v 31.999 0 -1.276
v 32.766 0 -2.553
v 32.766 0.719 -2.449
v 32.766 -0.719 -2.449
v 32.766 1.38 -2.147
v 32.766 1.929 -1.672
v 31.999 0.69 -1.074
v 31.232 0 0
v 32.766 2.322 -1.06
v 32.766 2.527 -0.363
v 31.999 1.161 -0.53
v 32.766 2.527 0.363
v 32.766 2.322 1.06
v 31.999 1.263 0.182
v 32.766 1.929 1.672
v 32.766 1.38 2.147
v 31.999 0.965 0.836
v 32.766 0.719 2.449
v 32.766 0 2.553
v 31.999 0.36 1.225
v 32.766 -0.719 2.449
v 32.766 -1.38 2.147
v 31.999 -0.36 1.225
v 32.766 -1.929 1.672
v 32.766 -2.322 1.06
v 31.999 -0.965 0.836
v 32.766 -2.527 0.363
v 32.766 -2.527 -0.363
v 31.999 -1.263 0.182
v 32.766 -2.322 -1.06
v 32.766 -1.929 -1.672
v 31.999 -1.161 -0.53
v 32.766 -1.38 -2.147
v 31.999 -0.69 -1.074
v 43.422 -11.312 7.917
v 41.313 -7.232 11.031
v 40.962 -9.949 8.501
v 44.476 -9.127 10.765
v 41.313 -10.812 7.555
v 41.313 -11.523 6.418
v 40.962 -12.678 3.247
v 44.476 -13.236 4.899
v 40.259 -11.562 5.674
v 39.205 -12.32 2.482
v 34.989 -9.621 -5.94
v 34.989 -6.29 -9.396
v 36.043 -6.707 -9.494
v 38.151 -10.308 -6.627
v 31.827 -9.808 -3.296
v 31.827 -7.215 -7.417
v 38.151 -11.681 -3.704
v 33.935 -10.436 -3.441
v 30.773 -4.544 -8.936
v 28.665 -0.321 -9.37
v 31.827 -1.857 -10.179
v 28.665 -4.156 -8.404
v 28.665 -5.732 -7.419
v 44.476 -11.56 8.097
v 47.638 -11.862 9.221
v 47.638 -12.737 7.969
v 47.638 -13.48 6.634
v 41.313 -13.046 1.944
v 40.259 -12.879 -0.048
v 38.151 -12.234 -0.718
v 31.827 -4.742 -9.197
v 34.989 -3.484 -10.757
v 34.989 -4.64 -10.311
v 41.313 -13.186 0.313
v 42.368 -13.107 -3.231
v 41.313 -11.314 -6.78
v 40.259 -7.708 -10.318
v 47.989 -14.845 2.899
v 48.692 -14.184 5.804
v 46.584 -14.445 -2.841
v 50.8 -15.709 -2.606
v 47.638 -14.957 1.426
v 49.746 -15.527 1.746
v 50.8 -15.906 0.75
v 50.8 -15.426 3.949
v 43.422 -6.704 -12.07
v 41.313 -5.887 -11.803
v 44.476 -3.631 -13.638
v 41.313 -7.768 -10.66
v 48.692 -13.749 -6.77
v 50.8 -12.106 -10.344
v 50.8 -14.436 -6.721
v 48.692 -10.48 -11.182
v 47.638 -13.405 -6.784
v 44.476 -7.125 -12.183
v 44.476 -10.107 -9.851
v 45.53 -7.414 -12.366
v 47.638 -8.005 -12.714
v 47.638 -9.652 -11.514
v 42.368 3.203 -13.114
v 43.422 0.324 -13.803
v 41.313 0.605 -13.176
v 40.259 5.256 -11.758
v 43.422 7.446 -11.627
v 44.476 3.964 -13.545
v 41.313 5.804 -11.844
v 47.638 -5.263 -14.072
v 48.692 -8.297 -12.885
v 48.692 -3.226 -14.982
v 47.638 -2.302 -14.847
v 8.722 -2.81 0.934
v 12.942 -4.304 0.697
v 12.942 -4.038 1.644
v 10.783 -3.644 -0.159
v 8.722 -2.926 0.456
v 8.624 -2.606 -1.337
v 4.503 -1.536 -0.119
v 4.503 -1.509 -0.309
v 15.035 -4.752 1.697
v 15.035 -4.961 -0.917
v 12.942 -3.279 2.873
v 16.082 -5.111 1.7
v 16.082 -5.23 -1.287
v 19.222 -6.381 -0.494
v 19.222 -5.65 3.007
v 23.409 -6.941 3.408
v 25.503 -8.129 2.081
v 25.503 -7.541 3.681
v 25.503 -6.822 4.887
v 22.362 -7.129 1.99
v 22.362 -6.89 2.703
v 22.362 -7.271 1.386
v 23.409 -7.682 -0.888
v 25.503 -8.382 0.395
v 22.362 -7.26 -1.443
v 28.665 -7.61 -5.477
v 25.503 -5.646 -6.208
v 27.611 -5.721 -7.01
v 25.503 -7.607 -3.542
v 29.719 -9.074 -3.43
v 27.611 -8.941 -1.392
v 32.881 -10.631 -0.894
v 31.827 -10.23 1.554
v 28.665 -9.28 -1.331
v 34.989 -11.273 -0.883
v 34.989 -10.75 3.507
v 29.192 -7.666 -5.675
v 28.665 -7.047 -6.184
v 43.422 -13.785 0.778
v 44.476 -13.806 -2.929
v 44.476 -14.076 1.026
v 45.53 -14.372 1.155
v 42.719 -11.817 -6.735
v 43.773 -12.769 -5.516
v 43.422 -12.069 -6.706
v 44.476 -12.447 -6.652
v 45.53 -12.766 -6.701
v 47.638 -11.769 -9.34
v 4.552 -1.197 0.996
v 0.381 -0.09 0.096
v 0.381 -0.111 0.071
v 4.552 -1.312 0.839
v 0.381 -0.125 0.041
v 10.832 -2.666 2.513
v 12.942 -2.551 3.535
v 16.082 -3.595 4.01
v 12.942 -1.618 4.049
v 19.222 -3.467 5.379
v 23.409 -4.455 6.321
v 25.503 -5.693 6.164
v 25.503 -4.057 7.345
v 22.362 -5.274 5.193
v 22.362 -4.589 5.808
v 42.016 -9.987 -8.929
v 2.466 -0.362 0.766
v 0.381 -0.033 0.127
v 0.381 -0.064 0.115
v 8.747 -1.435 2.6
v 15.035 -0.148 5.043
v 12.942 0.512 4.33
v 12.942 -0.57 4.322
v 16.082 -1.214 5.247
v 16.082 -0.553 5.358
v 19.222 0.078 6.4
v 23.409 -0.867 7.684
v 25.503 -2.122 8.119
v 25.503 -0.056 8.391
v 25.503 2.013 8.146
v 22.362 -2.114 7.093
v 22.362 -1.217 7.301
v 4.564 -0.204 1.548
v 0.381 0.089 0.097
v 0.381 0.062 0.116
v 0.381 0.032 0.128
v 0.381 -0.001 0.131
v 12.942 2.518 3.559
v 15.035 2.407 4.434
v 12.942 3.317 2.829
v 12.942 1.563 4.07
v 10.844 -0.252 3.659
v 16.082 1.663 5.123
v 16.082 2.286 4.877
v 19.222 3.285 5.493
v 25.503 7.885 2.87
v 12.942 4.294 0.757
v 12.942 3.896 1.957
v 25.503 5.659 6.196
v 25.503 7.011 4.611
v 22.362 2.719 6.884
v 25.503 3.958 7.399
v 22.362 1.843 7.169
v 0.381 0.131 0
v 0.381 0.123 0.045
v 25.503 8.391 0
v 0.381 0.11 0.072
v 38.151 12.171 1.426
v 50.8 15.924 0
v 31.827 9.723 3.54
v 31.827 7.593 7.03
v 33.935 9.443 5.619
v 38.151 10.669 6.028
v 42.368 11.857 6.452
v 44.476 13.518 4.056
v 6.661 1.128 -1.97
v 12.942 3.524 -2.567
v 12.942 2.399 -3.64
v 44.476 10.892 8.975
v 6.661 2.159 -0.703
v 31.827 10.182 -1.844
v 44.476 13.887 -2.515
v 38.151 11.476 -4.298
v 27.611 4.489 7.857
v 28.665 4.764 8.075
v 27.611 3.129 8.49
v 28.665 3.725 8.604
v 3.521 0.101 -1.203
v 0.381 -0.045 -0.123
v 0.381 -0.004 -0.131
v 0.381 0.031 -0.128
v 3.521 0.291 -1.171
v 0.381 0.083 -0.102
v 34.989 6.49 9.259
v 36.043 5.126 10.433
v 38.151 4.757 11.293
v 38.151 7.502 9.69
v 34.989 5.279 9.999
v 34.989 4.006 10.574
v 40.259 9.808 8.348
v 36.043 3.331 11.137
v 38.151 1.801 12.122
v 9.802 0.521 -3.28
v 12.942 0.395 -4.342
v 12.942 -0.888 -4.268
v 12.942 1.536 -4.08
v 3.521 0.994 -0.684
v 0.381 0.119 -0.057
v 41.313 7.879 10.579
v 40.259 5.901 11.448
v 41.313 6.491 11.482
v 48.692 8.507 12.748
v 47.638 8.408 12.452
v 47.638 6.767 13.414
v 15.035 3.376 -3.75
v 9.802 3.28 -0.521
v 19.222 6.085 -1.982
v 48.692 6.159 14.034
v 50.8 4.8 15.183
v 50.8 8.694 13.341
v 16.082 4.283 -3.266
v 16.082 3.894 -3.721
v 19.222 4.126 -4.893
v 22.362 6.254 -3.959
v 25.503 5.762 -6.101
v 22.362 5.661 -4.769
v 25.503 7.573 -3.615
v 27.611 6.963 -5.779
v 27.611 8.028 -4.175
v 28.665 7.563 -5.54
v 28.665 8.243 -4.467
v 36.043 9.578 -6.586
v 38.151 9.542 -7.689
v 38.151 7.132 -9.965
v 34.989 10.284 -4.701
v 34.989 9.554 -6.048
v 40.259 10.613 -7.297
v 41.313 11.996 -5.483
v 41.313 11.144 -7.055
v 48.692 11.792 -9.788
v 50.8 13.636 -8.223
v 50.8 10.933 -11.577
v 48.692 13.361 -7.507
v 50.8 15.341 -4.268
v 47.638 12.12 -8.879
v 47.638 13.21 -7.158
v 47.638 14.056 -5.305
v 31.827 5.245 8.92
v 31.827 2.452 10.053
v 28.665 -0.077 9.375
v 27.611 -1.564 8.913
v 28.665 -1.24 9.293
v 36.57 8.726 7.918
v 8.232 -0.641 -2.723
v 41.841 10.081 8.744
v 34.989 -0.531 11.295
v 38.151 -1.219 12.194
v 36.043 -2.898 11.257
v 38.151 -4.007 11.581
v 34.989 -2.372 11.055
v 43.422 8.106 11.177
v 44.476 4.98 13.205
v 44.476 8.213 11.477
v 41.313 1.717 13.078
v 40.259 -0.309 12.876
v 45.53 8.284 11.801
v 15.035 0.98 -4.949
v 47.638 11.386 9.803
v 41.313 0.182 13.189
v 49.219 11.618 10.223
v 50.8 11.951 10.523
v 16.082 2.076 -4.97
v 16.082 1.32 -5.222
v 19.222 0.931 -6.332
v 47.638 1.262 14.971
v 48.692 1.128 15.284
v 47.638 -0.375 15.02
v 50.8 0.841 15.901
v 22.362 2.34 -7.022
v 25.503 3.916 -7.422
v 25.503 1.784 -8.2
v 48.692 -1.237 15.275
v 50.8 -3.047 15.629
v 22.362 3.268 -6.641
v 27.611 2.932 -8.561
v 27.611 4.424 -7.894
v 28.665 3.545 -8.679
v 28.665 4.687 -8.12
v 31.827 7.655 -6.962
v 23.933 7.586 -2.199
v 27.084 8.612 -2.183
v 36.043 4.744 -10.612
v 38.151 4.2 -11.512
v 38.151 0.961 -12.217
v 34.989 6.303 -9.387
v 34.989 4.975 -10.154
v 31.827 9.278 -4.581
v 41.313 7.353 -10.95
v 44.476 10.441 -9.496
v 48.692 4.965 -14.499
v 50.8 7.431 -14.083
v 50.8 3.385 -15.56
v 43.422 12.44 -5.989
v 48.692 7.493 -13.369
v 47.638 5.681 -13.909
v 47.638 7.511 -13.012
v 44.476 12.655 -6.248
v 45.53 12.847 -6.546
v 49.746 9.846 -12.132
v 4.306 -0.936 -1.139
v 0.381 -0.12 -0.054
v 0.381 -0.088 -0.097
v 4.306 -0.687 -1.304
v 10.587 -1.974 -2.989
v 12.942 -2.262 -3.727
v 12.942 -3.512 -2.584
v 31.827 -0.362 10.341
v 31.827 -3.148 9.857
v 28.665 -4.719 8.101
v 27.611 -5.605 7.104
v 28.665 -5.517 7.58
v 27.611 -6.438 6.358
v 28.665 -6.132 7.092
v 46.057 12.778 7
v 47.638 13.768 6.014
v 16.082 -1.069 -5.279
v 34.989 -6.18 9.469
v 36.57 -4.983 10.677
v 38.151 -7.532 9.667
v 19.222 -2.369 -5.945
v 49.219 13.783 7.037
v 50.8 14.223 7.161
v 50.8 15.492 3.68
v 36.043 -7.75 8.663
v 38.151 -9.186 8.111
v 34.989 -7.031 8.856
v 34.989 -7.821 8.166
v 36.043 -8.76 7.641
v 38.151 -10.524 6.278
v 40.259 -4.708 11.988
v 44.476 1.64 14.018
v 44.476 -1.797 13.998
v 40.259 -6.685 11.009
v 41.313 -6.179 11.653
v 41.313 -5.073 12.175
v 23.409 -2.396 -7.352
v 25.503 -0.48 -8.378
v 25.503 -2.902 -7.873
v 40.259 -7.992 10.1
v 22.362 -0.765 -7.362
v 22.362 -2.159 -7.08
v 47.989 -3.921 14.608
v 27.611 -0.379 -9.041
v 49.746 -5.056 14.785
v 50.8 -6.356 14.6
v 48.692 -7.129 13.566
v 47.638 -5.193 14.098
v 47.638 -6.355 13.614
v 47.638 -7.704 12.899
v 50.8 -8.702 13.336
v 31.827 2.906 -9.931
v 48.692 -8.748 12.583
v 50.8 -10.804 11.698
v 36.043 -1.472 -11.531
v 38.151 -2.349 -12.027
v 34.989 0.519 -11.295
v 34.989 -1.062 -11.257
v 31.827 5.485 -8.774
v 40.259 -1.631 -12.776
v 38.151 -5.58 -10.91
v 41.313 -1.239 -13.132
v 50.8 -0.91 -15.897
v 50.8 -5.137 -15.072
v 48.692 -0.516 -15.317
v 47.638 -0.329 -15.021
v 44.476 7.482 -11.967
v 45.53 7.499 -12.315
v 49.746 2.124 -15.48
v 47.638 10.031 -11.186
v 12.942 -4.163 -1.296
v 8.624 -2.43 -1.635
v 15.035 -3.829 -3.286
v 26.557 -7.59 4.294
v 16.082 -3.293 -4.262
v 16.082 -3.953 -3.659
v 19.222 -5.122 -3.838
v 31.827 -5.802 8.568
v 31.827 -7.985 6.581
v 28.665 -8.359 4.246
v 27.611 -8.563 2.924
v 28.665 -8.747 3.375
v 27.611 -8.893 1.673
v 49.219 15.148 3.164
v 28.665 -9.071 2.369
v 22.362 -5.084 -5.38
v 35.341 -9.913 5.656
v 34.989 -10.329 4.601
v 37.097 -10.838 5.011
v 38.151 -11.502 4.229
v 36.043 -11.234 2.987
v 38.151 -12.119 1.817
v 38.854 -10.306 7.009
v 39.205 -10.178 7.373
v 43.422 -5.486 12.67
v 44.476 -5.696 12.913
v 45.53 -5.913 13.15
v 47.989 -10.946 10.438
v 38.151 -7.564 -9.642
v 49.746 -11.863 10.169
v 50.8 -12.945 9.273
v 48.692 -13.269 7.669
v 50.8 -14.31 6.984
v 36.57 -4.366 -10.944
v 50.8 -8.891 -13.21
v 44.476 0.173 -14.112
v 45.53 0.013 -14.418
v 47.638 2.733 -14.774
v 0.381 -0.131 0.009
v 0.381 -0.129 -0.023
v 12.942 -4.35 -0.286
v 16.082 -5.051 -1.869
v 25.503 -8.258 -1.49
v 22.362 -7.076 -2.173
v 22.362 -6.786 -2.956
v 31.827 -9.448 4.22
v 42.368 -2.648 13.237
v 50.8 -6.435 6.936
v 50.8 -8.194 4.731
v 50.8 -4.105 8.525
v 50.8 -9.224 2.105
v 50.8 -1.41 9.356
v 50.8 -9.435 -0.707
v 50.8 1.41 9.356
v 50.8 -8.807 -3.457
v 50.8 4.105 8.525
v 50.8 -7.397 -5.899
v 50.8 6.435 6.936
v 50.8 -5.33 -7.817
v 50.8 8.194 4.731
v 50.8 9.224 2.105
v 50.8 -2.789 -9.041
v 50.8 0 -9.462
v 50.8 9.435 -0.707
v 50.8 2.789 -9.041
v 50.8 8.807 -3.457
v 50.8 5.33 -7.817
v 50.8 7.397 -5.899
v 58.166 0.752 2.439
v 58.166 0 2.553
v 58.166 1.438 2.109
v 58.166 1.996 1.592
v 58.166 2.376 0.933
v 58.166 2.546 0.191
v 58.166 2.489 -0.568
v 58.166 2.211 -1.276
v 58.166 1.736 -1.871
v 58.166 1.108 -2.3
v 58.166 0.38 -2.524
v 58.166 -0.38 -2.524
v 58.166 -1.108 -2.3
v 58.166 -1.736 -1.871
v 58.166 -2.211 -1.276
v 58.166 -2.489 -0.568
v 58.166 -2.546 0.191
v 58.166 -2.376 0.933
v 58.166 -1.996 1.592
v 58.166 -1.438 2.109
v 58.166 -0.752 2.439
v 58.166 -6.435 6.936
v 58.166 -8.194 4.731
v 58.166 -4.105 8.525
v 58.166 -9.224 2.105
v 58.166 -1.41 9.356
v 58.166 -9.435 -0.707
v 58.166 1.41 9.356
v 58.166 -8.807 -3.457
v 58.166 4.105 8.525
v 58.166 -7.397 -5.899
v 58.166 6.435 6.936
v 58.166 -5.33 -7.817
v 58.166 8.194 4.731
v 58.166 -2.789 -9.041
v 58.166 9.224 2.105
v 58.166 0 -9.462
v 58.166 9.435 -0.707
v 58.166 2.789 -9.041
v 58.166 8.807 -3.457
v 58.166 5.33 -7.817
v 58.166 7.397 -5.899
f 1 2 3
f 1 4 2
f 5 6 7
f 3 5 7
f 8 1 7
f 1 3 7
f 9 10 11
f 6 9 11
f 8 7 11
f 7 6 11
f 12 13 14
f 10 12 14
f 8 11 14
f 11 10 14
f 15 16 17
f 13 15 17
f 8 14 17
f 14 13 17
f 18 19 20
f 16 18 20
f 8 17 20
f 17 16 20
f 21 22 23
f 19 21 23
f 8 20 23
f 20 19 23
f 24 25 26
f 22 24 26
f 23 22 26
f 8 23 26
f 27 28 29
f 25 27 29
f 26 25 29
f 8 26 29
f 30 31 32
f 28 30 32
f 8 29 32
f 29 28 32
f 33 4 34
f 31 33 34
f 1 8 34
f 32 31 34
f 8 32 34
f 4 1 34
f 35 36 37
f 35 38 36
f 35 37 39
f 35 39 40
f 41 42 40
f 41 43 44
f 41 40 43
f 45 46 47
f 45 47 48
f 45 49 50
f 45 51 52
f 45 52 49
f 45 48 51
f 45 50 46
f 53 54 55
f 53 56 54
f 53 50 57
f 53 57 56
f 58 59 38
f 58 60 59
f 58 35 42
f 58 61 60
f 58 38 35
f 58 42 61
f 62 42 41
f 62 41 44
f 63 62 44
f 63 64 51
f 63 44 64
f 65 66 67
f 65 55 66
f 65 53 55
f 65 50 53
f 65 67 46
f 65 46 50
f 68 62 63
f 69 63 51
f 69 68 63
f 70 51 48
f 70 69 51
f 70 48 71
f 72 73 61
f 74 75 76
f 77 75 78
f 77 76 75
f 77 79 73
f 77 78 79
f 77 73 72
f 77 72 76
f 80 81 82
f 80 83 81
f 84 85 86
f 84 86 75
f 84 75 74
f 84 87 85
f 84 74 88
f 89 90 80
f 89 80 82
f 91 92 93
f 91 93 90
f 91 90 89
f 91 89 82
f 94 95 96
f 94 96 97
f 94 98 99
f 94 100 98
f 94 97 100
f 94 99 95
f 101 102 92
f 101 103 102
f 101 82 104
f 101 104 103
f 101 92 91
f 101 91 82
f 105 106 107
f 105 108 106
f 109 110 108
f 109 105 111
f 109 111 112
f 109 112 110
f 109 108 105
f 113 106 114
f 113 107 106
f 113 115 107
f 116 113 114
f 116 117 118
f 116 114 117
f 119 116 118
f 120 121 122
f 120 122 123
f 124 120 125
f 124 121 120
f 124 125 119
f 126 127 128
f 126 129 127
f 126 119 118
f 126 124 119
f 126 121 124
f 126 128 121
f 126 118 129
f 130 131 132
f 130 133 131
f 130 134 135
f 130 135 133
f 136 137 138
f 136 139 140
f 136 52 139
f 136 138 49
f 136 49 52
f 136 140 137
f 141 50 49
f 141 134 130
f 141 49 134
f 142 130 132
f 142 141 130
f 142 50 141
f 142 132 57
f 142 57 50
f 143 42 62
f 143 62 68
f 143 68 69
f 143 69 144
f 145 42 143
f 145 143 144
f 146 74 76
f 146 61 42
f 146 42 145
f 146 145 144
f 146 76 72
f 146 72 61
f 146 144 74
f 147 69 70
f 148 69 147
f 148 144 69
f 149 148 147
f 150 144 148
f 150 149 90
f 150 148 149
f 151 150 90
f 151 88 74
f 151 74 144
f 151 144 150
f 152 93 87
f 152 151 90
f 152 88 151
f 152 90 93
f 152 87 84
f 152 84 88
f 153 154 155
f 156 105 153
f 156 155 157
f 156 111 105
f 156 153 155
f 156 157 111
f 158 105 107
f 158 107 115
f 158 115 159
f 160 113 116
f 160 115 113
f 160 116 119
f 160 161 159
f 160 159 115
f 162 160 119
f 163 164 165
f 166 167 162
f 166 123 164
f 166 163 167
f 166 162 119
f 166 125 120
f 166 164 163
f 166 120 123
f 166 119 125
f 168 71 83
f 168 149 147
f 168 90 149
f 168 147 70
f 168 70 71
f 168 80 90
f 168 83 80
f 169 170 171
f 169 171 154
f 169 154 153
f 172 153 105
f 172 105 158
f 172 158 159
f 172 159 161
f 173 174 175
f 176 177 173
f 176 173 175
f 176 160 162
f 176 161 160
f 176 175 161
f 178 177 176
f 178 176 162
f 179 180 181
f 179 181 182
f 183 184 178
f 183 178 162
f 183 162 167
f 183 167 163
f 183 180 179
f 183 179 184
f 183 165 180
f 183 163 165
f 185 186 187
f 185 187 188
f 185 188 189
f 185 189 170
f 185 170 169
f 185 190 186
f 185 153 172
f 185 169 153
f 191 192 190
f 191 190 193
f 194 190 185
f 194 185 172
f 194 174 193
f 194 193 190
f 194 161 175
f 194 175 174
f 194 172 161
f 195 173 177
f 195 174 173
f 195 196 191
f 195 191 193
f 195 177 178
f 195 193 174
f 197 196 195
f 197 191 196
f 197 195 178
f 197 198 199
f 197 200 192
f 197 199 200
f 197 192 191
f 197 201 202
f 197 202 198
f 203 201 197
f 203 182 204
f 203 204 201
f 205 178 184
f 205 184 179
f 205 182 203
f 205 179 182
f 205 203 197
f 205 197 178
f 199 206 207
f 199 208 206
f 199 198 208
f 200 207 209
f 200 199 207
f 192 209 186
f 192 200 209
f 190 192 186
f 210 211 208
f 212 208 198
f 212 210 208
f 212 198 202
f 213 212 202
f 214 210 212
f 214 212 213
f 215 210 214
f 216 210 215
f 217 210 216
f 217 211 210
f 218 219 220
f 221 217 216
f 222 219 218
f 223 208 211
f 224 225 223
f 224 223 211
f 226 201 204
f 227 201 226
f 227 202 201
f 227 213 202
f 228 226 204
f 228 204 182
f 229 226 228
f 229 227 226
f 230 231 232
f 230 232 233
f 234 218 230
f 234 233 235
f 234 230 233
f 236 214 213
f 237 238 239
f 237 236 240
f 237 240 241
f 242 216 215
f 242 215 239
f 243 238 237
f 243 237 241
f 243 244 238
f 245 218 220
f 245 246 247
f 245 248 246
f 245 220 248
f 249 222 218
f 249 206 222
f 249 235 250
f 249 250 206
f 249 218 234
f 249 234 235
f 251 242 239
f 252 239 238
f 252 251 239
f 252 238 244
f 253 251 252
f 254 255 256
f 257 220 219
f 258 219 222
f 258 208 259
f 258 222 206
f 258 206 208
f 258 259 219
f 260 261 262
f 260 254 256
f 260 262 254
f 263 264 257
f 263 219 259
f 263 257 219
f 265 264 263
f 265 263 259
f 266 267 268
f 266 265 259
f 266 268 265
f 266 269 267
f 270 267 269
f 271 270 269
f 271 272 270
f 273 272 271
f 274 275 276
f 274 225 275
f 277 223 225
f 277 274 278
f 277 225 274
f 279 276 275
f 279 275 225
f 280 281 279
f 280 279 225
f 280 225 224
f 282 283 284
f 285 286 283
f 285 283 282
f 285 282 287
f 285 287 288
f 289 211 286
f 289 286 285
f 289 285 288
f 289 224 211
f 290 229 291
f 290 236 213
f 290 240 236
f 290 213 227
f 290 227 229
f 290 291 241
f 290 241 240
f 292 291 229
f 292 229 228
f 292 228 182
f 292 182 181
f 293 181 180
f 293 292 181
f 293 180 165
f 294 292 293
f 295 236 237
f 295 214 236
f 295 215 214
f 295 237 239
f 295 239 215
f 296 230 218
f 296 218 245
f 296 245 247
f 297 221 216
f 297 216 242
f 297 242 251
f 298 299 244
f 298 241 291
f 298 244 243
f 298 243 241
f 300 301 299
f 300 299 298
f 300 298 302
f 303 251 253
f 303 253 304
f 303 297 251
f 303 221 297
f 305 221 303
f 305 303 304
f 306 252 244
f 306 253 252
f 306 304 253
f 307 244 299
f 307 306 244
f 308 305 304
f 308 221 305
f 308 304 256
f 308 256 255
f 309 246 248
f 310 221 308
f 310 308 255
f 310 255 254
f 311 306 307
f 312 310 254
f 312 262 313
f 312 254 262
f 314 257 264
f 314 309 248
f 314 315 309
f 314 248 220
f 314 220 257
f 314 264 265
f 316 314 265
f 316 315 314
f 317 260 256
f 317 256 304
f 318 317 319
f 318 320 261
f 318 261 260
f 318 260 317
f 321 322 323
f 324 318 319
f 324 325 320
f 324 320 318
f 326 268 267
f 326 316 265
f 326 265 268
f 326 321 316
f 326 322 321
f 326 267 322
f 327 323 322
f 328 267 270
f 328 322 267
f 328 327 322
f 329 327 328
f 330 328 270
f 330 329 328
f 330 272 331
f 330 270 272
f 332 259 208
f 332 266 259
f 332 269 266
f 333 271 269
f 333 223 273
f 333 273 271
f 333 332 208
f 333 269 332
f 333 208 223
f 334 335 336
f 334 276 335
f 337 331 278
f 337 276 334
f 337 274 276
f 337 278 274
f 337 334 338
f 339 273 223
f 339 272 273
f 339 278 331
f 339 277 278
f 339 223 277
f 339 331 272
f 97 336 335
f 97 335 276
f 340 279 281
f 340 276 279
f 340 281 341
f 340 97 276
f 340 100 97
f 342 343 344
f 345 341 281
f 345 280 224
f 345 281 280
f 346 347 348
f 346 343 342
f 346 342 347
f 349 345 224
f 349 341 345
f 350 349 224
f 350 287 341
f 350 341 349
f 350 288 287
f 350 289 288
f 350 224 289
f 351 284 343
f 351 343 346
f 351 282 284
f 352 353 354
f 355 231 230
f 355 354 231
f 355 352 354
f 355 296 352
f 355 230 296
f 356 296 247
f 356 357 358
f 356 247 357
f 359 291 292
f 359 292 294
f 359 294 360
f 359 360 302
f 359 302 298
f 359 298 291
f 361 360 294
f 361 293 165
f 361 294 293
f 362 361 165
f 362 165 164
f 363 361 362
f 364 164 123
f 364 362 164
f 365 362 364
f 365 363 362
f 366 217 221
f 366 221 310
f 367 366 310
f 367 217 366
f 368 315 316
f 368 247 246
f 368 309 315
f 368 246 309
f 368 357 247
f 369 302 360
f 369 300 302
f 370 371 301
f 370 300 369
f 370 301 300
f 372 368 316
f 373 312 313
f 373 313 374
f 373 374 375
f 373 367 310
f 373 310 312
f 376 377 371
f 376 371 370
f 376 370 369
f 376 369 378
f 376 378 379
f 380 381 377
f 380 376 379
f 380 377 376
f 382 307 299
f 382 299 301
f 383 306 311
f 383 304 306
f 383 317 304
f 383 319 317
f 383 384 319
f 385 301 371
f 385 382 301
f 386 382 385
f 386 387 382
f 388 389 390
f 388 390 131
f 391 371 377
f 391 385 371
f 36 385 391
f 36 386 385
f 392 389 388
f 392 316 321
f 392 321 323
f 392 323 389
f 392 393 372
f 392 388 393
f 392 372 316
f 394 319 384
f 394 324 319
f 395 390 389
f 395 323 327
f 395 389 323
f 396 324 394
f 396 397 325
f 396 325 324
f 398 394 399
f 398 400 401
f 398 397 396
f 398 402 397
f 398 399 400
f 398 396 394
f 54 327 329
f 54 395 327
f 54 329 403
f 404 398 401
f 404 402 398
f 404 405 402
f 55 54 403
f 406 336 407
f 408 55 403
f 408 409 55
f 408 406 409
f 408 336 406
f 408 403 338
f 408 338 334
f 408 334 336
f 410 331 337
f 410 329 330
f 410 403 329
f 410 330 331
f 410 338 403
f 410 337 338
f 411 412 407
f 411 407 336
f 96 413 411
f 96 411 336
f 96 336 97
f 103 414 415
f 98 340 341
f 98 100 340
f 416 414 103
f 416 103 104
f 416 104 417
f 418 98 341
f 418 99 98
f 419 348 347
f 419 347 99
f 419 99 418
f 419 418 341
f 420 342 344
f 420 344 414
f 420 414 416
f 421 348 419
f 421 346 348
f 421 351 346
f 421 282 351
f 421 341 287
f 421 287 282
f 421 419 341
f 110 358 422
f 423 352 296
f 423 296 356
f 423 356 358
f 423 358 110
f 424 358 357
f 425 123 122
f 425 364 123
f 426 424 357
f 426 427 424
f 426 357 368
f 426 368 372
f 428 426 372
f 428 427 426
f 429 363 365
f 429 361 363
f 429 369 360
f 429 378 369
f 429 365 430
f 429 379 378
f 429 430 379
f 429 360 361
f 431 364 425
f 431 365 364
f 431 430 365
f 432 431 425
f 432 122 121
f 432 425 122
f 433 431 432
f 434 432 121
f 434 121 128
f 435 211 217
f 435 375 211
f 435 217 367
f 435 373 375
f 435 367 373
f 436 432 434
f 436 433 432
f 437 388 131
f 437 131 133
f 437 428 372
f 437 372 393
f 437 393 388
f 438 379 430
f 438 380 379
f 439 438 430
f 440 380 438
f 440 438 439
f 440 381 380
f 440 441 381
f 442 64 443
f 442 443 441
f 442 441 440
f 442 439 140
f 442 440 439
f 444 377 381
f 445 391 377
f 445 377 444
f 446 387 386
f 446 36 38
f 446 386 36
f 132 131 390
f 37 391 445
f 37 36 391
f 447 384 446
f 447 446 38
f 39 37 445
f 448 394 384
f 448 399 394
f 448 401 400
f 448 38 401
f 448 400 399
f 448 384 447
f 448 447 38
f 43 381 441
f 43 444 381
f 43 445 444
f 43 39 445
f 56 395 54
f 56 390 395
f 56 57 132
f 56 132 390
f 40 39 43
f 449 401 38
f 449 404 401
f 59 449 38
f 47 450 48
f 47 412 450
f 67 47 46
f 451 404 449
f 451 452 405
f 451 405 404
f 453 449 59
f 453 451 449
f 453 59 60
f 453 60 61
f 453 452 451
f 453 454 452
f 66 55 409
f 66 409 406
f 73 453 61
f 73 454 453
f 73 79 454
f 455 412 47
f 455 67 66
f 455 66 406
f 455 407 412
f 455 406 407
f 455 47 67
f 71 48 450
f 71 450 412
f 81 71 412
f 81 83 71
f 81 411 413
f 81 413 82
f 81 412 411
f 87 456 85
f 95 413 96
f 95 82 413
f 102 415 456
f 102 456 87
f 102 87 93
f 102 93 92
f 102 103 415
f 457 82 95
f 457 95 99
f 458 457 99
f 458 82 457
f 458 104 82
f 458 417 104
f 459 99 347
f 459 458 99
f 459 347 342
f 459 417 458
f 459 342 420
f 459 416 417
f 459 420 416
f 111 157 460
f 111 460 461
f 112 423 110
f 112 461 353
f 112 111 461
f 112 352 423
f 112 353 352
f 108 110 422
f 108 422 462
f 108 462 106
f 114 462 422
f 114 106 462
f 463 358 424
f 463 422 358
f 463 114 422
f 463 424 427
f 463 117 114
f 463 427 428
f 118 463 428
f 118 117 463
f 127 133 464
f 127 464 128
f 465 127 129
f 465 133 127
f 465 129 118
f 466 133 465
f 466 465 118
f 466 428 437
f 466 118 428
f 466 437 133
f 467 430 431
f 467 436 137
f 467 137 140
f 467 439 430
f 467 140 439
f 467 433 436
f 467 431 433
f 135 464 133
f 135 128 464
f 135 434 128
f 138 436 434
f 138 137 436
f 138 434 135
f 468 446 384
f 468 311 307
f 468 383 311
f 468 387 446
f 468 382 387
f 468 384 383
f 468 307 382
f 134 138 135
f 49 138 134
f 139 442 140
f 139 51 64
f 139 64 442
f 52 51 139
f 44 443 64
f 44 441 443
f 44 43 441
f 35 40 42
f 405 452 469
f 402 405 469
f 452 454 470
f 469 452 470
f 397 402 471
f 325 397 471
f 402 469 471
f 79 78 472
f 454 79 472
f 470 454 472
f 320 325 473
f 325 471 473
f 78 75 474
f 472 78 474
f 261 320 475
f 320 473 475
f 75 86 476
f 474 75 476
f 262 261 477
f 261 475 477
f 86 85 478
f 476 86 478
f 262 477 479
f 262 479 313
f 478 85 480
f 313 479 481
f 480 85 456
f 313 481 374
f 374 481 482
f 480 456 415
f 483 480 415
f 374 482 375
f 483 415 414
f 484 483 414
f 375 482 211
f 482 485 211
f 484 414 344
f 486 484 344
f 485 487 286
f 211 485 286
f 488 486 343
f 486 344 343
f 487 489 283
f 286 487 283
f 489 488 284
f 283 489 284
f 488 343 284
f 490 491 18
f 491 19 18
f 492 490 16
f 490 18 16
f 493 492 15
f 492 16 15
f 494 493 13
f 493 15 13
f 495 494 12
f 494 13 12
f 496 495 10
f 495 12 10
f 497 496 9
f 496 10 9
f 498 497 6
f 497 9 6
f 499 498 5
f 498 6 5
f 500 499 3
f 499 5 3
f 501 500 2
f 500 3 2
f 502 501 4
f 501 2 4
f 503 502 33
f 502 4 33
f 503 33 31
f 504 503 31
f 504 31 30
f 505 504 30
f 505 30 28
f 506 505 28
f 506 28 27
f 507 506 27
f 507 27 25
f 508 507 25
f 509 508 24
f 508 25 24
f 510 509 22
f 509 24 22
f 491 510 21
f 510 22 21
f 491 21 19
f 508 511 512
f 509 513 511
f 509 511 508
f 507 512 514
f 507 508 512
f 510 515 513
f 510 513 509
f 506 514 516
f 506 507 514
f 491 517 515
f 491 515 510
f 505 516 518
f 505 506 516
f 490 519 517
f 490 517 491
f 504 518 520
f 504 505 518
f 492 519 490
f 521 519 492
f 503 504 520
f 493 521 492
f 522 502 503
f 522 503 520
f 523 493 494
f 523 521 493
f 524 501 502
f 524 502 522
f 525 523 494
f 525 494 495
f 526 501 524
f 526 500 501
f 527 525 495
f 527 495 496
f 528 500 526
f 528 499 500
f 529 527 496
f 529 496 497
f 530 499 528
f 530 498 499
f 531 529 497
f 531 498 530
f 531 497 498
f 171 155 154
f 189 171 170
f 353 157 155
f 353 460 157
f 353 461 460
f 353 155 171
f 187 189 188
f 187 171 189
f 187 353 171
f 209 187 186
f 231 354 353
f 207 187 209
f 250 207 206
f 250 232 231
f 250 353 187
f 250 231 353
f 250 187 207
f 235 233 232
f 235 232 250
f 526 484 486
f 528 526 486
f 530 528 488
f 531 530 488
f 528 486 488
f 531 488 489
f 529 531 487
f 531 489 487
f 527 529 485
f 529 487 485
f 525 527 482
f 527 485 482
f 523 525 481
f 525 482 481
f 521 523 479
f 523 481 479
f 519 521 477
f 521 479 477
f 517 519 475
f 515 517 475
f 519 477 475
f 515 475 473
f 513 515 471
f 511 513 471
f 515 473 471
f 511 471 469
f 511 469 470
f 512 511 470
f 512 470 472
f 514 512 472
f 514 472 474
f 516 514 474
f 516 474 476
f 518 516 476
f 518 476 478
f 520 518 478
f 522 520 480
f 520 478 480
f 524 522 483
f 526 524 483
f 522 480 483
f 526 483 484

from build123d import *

# Parameters (mm, degrees)
SKETCH2_W                   = 266.7
SKETCH2_H                   = 127
SKETCH2_W_2                 = 4.523471484
SKETCH2_H_2                 = 5.51968765
CUT_EXTRUDE1_DEPTH          = 52.104787934
CUT_EXTRUDE1_DEPTH_BACK     = 52.104787934
SKETCH3_R                   = 9.4615
BOSS_EXTRUDE1_DEPTH         = 7.366
F_1_4_20_TAPPED_HOLE1_D     = 5.1054
F_1_4_20_TAPPED_HOLE1_DEPTH = 25.4
F_1_4_20_TAPPED_HOLE1_TIP   = 1.533816902


with BuildPart() as part:
    # Sketch1 → Revolve1 (revolve)
    with BuildSketch(Plane.XY):
        with BuildLine():
            Line((304.8, 51.104787834), (304.8, 0))
            Line((304.8, 0), (0, 0))
            add(Edge.make_bspline(
                [(0, 0), (33.866666667, 11.685111304), (67.733333333, 21.735698196), (101.6, 30.235154067), (135.466666666, 37.244703775), (169.333333333, 42.80972925), (203.2, 46.96249326), (237.066666666, 49.724027415), (270.933333333, 51.104777124), (304.8, 51.104787834)],
                knots=[0.079928624, 0.079928624, 0.079928624, 0.079928624, 0.079928624, 0.079928624, 0.079928624, 0.079928624, 0.079928624, 0.079928624, 0.916357148, 0.916357148, 0.916357148, 0.916357148, 0.916357148, 0.916357148, 0.916357148, 0.916357148, 0.916357148, 0.916357148], degree=9))
        make_face()
    revolve(axis=Axis((0, 0, 0), (1, 0, 0)))

    # Sketch2 → Cut-Extrude1 (cut, two sides)
    with BuildSketch(Plane.XY) as cut_extrude1_sk:
        with Locations((184.15, 0)):
            Rectangle(SKETCH2_W, SKETCH2_H)
        with Locations((-1.880735742, 0)):
            Rectangle(SKETCH2_W_2, SKETCH2_H_2)
    extrude(amount=CUT_EXTRUDE1_DEPTH, mode=Mode.SUBTRACT)
    extrude(cut_extrude1_sk.sketch, amount=-CUT_EXTRUDE1_DEPTH_BACK, mode=Mode.SUBTRACT)

    # Sketch3 → Boss-Extrude1 (add)
    with BuildSketch(Plane(origin=(50.8, 0, 0), x_dir=(0, 0, -1), z_dir=(1, 0, 0))):
        Circle(SKETCH3_R)
    extrude(amount=BOSS_EXTRUDE1_DEPTH)

    # 1/4-20 Tapped Hole1
    with Locations(Plane(origin=(58.166, 0, 0), x_dir=(0, 0, -1), z_dir=(1, 0, 0))):
        with Locations((0, 0)):
            Hole(F_1_4_20_TAPPED_HOLE1_D / 2, depth=F_1_4_20_TAPPED_HOLE1_DEPTH)
            with Locations((0, 0, -(F_1_4_20_TAPPED_HOLE1_DEPTH + F_1_4_20_TAPPED_HOLE1_TIP / 2))):  # 118° drill point
                Cone(0, F_1_4_20_TAPPED_HOLE1_D / 2, F_1_4_20_TAPPED_HOLE1_TIP, mode=Mode.SUBTRACT)


solid = part.part
